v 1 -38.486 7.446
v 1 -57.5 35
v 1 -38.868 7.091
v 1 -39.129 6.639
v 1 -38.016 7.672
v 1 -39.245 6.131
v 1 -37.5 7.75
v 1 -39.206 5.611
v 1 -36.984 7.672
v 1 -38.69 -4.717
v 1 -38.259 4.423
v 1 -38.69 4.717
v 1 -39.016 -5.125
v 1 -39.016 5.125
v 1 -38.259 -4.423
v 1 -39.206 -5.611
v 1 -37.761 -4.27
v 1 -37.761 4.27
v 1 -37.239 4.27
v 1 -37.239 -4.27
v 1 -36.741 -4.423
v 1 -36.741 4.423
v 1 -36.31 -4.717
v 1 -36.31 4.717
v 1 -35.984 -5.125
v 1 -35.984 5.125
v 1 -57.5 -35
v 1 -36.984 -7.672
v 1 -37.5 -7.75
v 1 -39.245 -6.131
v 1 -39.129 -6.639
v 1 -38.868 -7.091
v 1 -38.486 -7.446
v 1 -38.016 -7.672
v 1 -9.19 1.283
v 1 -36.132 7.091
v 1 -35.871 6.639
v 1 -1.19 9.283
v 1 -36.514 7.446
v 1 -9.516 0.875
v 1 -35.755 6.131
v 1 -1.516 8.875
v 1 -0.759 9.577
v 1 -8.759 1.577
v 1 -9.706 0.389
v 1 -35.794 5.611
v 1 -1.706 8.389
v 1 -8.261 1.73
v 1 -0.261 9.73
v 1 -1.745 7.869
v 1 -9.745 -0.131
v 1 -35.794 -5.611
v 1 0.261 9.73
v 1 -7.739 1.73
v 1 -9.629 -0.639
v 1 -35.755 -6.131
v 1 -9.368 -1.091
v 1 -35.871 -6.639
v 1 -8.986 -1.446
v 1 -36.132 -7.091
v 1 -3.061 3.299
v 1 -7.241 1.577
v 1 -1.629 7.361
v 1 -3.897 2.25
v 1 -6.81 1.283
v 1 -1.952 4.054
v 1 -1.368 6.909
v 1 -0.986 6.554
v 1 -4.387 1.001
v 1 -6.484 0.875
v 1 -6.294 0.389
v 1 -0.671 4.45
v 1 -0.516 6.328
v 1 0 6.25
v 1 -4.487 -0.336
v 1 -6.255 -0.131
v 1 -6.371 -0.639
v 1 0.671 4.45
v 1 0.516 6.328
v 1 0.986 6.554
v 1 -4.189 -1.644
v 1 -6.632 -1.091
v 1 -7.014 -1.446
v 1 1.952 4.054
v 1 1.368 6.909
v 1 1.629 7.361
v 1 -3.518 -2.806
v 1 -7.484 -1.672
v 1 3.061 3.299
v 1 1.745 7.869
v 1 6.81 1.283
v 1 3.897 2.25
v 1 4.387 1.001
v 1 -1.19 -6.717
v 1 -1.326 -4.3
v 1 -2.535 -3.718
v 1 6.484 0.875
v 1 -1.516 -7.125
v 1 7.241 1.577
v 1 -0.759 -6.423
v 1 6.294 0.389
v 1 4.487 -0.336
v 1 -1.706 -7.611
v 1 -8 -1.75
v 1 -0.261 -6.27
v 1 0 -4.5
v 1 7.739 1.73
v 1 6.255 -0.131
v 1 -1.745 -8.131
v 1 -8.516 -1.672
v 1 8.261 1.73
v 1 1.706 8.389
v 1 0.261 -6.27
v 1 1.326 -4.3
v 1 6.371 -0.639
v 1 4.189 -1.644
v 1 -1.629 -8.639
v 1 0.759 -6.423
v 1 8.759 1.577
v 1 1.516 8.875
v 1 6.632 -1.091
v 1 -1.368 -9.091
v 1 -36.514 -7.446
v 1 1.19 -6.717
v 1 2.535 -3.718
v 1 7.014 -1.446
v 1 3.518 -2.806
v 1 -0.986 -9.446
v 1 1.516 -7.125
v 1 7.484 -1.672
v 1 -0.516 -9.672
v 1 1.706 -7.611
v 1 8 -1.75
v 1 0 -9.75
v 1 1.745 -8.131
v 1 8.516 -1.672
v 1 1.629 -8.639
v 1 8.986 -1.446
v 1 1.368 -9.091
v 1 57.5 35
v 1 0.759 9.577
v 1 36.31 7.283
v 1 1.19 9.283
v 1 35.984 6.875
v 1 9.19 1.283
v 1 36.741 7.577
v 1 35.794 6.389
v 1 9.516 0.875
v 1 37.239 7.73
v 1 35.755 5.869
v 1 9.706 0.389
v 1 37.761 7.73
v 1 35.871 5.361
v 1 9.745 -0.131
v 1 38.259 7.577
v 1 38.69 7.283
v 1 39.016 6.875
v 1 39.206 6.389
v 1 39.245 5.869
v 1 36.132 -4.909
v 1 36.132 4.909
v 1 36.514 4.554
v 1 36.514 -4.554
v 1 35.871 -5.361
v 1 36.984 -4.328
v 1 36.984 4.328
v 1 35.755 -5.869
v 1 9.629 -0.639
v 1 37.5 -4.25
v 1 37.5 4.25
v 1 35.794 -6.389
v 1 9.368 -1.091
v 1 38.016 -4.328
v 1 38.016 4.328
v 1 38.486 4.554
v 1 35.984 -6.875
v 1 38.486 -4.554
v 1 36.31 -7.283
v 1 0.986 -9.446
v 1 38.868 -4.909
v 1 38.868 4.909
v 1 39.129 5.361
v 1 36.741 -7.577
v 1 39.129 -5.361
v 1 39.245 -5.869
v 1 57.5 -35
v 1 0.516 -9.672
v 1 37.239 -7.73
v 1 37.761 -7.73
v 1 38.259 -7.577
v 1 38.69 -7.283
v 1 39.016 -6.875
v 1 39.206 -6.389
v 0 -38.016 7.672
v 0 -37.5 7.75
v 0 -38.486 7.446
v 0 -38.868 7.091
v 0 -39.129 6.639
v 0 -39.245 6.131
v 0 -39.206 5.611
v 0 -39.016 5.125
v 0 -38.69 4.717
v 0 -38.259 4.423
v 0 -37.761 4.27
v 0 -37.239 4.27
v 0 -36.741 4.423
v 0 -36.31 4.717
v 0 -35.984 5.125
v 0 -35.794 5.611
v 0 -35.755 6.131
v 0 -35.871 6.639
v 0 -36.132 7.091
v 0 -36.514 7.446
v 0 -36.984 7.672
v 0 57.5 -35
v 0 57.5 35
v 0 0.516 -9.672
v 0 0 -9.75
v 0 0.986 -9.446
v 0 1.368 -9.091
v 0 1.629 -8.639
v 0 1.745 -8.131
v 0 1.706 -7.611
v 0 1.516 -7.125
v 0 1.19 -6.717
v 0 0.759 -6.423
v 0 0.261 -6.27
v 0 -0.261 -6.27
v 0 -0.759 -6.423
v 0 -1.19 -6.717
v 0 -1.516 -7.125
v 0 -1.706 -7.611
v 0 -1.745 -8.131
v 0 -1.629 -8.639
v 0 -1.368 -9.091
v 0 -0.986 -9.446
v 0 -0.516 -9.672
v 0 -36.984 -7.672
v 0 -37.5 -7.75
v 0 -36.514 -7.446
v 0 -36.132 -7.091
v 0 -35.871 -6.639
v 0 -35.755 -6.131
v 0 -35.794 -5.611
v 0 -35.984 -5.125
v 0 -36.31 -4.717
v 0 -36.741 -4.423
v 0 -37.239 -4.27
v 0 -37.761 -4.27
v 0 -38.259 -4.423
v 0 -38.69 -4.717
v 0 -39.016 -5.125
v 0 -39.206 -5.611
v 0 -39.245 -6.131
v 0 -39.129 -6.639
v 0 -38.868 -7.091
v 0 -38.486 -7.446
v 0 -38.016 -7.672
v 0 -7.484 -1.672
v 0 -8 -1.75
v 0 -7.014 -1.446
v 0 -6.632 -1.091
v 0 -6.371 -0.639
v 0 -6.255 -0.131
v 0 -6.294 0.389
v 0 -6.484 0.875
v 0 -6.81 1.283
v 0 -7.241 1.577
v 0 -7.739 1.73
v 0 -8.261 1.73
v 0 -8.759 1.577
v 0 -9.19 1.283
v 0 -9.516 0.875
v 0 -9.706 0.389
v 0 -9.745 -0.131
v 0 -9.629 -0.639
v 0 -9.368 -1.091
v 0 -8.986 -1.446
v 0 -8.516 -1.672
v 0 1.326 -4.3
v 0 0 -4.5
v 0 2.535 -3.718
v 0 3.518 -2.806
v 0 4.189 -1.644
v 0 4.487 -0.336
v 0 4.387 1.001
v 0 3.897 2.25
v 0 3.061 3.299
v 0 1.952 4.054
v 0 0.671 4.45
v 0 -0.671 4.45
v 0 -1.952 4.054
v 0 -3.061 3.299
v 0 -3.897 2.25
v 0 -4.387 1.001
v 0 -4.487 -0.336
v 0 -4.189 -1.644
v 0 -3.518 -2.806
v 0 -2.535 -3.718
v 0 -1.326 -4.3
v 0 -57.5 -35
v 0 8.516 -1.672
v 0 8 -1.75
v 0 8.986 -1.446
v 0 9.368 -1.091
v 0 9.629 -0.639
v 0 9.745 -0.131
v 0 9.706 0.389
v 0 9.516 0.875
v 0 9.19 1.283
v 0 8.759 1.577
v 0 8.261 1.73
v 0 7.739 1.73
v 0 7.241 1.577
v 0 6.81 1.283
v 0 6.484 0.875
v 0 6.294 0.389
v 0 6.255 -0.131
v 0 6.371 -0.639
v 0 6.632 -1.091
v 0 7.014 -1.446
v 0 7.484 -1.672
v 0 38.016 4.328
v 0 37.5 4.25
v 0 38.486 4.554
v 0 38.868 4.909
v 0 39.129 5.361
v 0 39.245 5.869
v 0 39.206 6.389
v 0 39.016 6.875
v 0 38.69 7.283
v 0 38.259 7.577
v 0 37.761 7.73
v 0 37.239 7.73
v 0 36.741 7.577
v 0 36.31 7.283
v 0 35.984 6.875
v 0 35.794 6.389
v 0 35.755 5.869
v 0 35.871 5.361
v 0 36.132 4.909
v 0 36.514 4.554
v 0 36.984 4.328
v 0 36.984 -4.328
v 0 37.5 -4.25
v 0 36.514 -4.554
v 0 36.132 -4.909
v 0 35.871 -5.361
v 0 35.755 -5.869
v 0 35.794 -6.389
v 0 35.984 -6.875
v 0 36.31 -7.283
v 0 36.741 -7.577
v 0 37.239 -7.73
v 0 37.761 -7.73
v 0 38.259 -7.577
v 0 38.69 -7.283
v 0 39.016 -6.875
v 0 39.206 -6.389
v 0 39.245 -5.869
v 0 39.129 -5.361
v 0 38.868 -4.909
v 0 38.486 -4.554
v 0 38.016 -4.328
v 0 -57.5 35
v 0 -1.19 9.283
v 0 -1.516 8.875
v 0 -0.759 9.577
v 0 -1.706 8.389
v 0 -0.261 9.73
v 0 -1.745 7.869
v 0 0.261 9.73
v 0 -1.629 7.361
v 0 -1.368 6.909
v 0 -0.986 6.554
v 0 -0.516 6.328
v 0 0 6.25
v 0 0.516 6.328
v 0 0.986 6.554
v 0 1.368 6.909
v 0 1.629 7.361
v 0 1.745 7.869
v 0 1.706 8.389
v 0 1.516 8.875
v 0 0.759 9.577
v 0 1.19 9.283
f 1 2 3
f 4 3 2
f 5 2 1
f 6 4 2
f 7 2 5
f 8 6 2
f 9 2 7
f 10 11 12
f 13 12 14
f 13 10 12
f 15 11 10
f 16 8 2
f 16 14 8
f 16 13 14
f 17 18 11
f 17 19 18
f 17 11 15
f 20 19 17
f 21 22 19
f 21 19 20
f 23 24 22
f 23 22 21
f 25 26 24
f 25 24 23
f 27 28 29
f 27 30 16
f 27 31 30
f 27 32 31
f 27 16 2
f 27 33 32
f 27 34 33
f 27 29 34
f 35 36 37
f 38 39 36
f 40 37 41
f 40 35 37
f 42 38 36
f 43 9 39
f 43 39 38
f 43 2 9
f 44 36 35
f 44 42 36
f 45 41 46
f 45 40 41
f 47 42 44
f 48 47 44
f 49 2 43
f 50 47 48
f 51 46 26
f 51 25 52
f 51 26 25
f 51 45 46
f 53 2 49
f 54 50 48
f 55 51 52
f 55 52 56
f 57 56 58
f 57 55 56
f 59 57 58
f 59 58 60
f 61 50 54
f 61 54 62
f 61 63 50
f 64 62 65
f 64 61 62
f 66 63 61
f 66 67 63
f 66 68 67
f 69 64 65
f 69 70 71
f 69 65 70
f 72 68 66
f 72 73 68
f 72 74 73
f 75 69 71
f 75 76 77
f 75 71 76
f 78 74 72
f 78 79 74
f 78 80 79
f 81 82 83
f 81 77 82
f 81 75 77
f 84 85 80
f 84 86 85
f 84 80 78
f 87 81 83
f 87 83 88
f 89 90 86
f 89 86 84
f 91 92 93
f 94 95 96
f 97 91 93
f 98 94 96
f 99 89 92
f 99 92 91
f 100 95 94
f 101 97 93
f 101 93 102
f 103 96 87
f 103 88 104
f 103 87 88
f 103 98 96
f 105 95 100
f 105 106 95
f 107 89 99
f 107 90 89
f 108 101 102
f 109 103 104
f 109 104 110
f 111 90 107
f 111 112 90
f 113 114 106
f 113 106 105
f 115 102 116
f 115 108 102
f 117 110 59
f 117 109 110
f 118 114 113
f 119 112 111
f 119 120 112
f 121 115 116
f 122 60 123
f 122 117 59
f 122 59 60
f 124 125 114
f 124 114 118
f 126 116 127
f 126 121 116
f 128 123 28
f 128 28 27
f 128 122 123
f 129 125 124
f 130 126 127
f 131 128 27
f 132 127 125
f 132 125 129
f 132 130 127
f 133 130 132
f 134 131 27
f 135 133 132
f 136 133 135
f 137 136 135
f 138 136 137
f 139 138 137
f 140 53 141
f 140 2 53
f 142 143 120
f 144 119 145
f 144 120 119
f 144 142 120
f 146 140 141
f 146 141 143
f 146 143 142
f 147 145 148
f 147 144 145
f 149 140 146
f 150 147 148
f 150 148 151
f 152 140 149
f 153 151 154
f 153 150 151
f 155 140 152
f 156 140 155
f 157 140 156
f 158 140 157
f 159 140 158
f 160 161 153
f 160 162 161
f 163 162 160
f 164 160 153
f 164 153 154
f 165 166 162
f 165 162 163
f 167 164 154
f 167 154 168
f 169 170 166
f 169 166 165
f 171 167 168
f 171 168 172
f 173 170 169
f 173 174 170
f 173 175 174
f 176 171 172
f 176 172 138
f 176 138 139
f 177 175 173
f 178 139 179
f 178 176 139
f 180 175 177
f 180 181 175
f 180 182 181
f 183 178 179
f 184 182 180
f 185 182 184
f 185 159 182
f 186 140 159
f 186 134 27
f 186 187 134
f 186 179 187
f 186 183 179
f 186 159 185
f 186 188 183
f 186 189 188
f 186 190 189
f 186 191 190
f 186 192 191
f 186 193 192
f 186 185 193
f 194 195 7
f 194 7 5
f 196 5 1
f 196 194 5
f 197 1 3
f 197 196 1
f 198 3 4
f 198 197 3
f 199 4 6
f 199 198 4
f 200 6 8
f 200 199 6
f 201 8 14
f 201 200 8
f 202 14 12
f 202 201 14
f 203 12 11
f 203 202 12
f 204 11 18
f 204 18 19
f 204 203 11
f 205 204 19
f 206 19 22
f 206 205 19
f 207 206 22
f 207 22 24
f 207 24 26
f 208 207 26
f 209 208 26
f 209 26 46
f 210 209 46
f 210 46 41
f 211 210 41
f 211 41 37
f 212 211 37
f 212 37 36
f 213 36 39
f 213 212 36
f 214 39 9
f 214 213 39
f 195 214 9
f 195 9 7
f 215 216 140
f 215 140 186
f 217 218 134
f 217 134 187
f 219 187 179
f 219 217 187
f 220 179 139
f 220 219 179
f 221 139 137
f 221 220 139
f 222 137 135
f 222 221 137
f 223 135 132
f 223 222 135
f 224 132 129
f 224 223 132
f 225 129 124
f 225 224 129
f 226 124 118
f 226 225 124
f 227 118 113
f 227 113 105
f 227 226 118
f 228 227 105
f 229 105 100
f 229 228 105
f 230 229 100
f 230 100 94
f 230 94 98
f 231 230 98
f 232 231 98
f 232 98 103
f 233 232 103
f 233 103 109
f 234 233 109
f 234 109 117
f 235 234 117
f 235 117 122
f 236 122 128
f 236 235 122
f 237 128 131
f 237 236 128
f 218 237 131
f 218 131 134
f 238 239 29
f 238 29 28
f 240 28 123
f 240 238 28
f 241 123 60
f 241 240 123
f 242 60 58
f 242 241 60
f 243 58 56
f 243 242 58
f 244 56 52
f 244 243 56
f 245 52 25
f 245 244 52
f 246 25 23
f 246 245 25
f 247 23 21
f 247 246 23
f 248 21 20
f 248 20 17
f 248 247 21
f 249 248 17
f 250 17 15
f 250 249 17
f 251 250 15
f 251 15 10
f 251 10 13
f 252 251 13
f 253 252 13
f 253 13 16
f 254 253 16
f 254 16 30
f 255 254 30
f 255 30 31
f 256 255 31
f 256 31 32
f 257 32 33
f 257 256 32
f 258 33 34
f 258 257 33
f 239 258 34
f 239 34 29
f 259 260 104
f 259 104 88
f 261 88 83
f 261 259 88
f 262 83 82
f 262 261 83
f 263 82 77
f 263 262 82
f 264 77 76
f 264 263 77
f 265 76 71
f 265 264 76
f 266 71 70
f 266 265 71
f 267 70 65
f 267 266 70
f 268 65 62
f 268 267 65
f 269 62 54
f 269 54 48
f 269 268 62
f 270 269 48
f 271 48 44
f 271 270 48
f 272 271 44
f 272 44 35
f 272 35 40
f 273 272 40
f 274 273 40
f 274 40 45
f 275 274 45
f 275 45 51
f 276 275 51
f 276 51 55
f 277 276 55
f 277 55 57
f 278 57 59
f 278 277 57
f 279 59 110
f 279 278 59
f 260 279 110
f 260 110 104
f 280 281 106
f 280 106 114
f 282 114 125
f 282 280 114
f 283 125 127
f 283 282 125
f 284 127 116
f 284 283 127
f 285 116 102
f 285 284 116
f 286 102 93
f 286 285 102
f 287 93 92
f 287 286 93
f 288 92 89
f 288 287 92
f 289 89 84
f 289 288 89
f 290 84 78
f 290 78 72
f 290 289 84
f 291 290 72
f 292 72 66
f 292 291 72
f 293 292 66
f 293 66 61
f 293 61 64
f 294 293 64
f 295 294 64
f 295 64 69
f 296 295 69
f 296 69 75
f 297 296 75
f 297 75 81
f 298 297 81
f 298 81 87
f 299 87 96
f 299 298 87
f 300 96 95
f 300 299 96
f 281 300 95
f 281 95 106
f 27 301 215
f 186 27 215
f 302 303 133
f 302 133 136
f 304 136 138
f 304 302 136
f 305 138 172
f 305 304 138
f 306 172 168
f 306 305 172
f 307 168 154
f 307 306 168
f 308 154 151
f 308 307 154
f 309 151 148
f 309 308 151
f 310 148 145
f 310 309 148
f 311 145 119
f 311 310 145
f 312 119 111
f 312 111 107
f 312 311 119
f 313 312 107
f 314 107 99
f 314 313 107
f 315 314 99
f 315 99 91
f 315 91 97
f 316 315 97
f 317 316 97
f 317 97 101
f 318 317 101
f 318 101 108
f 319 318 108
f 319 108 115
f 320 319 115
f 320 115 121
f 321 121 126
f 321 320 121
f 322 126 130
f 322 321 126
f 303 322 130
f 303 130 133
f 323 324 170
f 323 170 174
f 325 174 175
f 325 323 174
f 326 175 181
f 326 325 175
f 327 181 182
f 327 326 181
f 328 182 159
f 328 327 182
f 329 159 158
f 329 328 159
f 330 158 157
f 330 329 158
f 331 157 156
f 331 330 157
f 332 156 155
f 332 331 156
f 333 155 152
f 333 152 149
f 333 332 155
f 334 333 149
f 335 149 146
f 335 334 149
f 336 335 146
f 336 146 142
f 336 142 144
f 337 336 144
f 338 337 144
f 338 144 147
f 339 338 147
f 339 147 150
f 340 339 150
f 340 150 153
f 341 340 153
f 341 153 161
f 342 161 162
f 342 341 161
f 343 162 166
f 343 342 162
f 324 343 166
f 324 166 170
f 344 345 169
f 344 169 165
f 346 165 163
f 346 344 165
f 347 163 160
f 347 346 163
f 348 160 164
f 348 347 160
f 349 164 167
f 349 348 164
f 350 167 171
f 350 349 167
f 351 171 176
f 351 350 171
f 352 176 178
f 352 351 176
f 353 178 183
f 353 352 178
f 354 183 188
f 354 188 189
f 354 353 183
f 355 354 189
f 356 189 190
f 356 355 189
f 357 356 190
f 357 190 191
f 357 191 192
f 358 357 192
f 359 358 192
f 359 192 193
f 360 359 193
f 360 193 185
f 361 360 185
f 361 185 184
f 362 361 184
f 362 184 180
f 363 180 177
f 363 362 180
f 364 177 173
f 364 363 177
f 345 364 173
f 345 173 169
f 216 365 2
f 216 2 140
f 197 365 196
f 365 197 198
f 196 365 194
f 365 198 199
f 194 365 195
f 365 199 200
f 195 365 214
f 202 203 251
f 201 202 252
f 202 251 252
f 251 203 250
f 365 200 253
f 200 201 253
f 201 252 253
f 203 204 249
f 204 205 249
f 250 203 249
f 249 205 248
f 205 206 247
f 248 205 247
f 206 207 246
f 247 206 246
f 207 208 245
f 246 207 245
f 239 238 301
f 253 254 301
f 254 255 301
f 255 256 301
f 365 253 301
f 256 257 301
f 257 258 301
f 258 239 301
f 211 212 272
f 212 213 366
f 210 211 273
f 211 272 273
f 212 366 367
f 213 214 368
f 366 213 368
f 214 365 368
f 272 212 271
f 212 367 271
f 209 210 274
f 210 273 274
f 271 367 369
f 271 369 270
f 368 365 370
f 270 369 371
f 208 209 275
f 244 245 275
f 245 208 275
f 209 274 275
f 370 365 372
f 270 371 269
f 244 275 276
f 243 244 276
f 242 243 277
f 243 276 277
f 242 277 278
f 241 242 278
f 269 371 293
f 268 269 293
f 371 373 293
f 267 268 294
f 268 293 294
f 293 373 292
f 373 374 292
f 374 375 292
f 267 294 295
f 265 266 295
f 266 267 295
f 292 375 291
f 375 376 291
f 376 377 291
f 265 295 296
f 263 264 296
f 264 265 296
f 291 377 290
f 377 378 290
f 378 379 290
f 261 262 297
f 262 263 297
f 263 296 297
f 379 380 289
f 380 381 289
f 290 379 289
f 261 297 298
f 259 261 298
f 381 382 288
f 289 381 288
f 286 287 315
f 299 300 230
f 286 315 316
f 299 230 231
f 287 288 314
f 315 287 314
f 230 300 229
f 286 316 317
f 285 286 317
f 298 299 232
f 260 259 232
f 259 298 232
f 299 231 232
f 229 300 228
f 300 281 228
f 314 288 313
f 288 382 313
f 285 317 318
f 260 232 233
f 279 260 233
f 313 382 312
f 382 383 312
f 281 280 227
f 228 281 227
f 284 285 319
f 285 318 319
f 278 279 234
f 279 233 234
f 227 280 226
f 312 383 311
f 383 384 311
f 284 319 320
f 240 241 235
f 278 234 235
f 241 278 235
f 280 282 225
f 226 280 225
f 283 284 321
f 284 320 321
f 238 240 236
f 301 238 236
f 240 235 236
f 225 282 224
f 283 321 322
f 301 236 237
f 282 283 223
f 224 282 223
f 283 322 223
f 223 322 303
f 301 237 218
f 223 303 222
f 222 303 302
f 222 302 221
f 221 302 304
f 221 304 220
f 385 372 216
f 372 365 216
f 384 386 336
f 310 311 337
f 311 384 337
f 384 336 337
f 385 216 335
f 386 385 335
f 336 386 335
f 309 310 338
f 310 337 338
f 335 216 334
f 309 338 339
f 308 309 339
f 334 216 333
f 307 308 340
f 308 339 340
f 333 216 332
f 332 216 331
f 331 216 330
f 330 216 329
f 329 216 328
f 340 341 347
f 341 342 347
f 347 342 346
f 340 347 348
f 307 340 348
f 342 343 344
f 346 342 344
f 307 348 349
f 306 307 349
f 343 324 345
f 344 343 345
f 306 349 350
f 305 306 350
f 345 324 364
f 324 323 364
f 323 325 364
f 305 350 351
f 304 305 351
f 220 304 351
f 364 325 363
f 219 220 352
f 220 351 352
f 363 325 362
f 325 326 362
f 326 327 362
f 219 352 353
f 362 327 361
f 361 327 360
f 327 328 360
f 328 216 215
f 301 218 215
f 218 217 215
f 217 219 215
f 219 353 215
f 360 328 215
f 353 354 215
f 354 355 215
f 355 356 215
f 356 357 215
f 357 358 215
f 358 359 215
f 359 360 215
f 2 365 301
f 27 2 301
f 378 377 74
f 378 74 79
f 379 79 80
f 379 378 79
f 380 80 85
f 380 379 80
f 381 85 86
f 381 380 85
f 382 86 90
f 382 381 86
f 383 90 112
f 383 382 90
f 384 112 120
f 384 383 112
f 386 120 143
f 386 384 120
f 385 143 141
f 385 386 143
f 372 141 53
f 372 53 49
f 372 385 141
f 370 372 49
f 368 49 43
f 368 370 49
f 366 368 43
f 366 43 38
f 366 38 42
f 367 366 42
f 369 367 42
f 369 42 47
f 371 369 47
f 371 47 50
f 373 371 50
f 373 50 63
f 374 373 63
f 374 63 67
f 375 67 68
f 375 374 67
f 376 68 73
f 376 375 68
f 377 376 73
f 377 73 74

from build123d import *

# Parameters (mm, degrees)
SKETCH1_W           = 70
SKETCH1_H           = 115
SKETCH1_R           = 4.5
SKETCH1_R_2         = 1.75
BOSS_EXTRUDE1_DEPTH = 1


with BuildPart() as part:
    # Sketch1 → Boss-Extrude1 (new body)
    with BuildSketch(Plane(origin=(0, 0, 0), x_dir=(0, 0, -1), z_dir=(1, 0, 0))):
        Rectangle(SKETCH1_W, SKETCH1_H)
        Circle(SKETCH1_R, mode=Mode.SUBTRACT)
        with Locations((0, 8)):
            Circle(SKETCH1_R_2, mode=Mode.SUBTRACT)
        with Locations((8, 0)):
            Circle(SKETCH1_R_2, mode=Mode.SUBTRACT)
        with Locations((0, -8)):
            Circle(SKETCH1_R_2, mode=Mode.SUBTRACT)
        with Locations((-8, 0)):
            Circle(SKETCH1_R_2, mode=Mode.SUBTRACT)
        with Locations((-6, 37.5)):
            Circle(SKETCH1_R_2, mode=Mode.SUBTRACT)
        with Locations(Location((6, 37.5, 0), (0, 0, 180))):
            Circle(SKETCH1_R_2, mode=Mode.SUBTRACT)
        with Locations((6, -37.5)):
            Circle(SKETCH1_R_2, mode=Mode.SUBTRACT)
        with Locations(Location((-6, -37.5, 0), (0, 0, 180))):
            Circle(SKETCH1_R_2, mode=Mode.SUBTRACT)
    extrude(amount=BOSS_EXTRUDE1_DEPTH)


solid = part.part
